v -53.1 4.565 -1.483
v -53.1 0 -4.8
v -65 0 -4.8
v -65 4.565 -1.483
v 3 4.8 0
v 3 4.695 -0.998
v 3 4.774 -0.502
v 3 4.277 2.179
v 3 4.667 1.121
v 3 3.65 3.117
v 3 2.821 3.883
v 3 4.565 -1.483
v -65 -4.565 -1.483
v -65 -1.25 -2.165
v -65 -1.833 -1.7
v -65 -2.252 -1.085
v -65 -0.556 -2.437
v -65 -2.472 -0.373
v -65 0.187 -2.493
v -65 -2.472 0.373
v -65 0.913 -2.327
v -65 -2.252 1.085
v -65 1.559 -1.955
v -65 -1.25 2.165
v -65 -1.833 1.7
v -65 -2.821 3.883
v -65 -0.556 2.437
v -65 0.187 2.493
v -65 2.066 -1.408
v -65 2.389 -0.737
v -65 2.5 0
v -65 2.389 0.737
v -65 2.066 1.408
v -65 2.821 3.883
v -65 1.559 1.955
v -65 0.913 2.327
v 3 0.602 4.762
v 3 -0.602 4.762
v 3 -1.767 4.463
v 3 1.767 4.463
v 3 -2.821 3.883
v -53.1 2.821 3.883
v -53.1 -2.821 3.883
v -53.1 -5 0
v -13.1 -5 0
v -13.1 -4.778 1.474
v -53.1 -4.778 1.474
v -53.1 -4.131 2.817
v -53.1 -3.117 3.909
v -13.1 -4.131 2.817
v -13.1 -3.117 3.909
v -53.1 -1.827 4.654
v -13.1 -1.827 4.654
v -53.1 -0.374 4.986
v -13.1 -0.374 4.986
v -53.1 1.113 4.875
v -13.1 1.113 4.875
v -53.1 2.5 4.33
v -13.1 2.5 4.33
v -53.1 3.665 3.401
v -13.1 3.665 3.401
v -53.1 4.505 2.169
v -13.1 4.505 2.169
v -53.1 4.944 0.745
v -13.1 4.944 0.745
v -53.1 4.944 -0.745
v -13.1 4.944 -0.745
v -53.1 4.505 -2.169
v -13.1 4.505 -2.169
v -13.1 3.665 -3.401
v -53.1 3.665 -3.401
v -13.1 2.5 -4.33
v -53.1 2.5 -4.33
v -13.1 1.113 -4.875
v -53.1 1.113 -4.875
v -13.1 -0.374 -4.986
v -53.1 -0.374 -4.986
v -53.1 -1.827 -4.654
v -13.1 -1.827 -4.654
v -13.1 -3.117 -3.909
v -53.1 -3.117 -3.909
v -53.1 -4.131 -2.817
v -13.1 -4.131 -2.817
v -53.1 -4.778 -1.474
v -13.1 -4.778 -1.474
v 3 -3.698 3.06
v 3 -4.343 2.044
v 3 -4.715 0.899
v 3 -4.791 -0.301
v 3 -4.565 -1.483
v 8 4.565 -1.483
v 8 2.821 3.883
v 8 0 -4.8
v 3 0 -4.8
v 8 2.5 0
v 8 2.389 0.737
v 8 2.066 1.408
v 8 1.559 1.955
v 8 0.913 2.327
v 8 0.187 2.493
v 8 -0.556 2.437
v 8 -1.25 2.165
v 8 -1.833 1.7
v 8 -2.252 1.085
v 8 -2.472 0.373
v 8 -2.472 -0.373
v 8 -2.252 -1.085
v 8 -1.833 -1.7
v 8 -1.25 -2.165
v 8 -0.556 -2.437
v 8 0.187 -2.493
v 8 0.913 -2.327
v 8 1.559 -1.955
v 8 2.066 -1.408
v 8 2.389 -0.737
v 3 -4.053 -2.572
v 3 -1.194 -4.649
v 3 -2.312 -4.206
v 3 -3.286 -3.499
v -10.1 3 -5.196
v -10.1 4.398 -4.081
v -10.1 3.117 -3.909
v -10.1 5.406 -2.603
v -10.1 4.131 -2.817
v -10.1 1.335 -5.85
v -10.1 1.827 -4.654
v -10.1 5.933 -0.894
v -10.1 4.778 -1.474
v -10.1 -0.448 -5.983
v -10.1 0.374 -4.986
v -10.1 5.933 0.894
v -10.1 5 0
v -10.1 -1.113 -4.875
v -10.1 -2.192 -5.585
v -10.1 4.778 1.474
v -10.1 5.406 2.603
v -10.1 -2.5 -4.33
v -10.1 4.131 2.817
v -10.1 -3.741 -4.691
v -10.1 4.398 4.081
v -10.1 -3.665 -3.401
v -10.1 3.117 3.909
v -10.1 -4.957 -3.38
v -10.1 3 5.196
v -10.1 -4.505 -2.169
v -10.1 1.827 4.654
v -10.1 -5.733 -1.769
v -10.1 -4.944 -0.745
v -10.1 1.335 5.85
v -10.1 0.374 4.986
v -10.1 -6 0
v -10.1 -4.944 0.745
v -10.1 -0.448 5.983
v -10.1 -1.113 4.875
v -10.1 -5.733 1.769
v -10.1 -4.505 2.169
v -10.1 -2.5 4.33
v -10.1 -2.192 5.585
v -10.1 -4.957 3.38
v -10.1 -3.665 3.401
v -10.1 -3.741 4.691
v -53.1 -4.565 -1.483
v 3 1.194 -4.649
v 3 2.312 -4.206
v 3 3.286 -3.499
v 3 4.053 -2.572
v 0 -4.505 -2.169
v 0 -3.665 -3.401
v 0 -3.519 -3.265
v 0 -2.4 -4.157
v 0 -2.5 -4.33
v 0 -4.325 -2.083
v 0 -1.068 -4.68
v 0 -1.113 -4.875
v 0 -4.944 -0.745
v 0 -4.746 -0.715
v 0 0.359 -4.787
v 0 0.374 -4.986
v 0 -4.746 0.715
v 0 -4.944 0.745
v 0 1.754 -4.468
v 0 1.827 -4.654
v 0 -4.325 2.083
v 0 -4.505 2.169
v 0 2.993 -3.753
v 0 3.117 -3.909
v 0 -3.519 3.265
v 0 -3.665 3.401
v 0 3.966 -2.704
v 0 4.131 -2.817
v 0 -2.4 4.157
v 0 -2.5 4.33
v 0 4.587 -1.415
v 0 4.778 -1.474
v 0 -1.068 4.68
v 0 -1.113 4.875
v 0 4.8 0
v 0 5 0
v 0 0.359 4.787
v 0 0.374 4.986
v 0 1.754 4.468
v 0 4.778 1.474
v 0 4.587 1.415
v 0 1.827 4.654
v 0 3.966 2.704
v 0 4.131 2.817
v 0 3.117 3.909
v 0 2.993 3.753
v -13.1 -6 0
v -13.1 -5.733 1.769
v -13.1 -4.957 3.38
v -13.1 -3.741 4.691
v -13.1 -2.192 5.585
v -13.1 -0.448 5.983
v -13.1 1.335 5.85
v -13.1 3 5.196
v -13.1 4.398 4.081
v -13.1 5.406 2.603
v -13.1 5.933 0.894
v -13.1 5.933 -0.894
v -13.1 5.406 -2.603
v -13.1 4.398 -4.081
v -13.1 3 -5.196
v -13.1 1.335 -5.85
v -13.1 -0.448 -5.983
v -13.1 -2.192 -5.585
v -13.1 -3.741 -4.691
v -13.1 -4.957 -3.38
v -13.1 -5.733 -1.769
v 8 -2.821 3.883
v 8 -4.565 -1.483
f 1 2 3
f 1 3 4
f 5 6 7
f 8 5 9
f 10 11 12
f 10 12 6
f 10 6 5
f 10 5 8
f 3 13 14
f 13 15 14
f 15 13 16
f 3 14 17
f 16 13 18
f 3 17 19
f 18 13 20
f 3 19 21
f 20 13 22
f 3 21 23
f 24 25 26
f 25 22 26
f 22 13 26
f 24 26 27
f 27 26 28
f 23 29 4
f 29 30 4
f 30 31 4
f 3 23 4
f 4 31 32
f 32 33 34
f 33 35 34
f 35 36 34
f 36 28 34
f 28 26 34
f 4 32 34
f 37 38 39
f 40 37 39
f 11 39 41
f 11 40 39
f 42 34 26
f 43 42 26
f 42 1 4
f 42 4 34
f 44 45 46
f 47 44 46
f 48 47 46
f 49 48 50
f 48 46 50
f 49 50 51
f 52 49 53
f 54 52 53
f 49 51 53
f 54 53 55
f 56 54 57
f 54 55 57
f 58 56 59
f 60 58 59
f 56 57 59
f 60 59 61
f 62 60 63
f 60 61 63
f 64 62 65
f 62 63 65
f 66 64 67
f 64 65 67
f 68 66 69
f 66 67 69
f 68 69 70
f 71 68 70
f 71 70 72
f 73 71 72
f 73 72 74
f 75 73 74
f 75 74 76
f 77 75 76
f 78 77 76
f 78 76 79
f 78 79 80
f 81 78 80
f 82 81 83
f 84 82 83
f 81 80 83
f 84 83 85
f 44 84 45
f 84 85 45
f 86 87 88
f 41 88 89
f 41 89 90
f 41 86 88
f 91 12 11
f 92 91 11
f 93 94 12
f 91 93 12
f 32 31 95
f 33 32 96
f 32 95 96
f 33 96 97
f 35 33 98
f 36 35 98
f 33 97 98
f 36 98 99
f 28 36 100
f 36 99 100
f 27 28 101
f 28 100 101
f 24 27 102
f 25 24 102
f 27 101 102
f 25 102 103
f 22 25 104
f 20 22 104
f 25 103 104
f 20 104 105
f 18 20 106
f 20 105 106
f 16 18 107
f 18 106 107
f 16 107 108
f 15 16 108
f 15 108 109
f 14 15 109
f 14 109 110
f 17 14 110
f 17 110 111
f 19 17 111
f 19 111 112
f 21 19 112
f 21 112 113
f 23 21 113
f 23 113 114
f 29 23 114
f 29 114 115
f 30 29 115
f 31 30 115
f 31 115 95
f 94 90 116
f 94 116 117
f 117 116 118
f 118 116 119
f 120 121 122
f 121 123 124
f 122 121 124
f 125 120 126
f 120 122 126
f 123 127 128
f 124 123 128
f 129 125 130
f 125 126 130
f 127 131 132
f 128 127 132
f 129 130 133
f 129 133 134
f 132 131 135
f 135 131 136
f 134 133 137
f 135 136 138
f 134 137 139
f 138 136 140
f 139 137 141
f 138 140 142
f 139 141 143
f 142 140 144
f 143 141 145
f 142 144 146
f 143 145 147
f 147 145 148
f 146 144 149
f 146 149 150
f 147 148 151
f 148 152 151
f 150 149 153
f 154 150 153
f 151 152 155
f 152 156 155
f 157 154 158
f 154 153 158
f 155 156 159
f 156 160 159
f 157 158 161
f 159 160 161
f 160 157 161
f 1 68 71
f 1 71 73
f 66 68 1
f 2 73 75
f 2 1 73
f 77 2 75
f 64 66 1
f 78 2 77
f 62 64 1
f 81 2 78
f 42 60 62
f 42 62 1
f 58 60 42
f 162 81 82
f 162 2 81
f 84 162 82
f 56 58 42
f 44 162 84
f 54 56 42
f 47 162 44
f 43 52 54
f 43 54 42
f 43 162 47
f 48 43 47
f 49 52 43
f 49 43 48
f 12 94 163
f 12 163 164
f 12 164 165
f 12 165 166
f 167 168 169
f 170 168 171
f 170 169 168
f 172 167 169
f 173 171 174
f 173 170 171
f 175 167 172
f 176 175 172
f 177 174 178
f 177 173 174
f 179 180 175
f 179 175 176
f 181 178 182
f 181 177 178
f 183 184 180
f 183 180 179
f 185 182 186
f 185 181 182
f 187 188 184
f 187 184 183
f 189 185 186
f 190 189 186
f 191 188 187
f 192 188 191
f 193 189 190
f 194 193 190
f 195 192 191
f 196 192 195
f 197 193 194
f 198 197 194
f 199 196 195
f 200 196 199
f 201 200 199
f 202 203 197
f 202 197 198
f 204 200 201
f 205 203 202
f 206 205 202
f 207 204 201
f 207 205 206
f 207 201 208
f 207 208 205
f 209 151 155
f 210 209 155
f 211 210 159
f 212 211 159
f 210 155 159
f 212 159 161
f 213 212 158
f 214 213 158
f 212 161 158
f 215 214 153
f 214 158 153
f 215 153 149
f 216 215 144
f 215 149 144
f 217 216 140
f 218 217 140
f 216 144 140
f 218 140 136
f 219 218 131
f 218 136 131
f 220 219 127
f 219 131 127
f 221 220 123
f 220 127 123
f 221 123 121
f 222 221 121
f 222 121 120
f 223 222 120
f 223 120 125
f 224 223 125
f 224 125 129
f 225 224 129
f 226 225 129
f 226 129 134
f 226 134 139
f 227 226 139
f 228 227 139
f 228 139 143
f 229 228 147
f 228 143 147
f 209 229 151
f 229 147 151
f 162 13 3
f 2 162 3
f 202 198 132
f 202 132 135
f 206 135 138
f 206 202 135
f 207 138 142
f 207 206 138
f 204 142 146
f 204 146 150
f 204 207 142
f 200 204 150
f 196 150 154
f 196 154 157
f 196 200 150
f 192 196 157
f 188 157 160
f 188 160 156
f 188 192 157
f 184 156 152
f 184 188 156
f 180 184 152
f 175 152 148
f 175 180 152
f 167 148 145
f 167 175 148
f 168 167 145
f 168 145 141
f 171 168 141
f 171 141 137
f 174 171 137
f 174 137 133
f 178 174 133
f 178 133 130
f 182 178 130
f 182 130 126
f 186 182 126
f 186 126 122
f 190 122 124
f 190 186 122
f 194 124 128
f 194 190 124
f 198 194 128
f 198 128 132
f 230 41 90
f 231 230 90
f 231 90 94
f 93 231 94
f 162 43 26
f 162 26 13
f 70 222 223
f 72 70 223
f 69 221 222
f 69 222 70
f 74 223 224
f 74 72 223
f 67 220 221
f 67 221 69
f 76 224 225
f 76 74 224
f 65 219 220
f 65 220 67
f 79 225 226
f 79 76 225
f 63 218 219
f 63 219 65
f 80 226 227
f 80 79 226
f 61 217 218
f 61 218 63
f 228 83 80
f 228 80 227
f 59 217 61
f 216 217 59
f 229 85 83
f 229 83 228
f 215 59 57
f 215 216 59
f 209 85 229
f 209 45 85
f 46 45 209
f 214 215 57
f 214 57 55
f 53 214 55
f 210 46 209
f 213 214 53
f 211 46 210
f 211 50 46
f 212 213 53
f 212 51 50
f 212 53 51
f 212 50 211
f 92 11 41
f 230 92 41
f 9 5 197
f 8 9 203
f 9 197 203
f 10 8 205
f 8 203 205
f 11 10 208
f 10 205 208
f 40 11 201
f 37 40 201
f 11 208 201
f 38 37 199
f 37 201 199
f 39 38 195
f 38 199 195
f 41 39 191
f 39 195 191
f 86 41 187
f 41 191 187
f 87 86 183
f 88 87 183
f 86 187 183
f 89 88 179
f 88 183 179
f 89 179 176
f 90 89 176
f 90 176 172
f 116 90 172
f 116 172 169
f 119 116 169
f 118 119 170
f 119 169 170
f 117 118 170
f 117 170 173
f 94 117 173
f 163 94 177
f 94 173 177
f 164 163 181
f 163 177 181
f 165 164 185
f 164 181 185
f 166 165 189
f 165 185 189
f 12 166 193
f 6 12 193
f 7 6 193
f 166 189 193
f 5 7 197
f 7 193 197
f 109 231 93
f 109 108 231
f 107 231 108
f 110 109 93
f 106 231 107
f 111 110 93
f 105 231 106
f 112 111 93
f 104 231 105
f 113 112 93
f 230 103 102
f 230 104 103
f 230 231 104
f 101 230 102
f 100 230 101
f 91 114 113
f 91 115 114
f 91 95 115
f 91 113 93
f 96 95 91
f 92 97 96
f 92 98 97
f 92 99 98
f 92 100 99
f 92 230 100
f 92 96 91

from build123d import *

# Parameters (mm, degrees)
F0_R          = 5
F1_DEPTH      = 10.1
F2_R          = 4.8
F3_DEPTH      = 3
F5_DEPTH      = 5
F5_DEPTH_BACK = 68
F6_R          = 6
F7_DEPTH      = 3
F8_R          = 5
F9_DEPTH      = 40
F10_R         = 2.5
F11_DEPTH     = 80


with BuildPart() as f1:
    # F0 (on Right) → F1 (new body)
    with BuildSketch(Plane.YZ):
        Circle(F0_R)
    extrude(amount=-F1_DEPTH)

    # F2 (on face) → F3 (join)
    with BuildSketch(Plane.YZ):
        Circle(F2_R)
    extrude(amount=F3_DEPTH)

    # F4 (on face) → F5 (join, two sides)
    with BuildSketch(Plane.YZ.offset(3)) as f5_sk:
        Polygon((-4.565071, -1.483282), (0, -4.8), (4.565071, -1.483282), (2.821369, 3.883282), (-2.821369, 3.883282), align=None)
    extrude(amount=F5_DEPTH)
    extrude(f5_sk.sketch, amount=-F5_DEPTH_BACK)

    # F6 (on face) → F7 (join)
    with BuildSketch(Plane(origin=(-10.1, 0, 0), x_dir=(0, -1, 0), z_dir=(-1, 0, 0))):
        Circle(F6_R)
    extrude(amount=F7_DEPTH)

    # F8 (on face) → F9 (join)
    with BuildSketch(Plane(origin=(-13.1, 0, 0), x_dir=(0, -1, 0), z_dir=(-1, 0, 0))):
        Circle(F8_R)
    extrude(amount=F9_DEPTH)

    # F10 (on face) → F11 (cut)
    with BuildSketch(Plane.YZ.offset(8)):
        Circle(F10_R)
    extrude(amount=-F11_DEPTH, mode=Mode.SUBTRACT)


solid = f1.part
